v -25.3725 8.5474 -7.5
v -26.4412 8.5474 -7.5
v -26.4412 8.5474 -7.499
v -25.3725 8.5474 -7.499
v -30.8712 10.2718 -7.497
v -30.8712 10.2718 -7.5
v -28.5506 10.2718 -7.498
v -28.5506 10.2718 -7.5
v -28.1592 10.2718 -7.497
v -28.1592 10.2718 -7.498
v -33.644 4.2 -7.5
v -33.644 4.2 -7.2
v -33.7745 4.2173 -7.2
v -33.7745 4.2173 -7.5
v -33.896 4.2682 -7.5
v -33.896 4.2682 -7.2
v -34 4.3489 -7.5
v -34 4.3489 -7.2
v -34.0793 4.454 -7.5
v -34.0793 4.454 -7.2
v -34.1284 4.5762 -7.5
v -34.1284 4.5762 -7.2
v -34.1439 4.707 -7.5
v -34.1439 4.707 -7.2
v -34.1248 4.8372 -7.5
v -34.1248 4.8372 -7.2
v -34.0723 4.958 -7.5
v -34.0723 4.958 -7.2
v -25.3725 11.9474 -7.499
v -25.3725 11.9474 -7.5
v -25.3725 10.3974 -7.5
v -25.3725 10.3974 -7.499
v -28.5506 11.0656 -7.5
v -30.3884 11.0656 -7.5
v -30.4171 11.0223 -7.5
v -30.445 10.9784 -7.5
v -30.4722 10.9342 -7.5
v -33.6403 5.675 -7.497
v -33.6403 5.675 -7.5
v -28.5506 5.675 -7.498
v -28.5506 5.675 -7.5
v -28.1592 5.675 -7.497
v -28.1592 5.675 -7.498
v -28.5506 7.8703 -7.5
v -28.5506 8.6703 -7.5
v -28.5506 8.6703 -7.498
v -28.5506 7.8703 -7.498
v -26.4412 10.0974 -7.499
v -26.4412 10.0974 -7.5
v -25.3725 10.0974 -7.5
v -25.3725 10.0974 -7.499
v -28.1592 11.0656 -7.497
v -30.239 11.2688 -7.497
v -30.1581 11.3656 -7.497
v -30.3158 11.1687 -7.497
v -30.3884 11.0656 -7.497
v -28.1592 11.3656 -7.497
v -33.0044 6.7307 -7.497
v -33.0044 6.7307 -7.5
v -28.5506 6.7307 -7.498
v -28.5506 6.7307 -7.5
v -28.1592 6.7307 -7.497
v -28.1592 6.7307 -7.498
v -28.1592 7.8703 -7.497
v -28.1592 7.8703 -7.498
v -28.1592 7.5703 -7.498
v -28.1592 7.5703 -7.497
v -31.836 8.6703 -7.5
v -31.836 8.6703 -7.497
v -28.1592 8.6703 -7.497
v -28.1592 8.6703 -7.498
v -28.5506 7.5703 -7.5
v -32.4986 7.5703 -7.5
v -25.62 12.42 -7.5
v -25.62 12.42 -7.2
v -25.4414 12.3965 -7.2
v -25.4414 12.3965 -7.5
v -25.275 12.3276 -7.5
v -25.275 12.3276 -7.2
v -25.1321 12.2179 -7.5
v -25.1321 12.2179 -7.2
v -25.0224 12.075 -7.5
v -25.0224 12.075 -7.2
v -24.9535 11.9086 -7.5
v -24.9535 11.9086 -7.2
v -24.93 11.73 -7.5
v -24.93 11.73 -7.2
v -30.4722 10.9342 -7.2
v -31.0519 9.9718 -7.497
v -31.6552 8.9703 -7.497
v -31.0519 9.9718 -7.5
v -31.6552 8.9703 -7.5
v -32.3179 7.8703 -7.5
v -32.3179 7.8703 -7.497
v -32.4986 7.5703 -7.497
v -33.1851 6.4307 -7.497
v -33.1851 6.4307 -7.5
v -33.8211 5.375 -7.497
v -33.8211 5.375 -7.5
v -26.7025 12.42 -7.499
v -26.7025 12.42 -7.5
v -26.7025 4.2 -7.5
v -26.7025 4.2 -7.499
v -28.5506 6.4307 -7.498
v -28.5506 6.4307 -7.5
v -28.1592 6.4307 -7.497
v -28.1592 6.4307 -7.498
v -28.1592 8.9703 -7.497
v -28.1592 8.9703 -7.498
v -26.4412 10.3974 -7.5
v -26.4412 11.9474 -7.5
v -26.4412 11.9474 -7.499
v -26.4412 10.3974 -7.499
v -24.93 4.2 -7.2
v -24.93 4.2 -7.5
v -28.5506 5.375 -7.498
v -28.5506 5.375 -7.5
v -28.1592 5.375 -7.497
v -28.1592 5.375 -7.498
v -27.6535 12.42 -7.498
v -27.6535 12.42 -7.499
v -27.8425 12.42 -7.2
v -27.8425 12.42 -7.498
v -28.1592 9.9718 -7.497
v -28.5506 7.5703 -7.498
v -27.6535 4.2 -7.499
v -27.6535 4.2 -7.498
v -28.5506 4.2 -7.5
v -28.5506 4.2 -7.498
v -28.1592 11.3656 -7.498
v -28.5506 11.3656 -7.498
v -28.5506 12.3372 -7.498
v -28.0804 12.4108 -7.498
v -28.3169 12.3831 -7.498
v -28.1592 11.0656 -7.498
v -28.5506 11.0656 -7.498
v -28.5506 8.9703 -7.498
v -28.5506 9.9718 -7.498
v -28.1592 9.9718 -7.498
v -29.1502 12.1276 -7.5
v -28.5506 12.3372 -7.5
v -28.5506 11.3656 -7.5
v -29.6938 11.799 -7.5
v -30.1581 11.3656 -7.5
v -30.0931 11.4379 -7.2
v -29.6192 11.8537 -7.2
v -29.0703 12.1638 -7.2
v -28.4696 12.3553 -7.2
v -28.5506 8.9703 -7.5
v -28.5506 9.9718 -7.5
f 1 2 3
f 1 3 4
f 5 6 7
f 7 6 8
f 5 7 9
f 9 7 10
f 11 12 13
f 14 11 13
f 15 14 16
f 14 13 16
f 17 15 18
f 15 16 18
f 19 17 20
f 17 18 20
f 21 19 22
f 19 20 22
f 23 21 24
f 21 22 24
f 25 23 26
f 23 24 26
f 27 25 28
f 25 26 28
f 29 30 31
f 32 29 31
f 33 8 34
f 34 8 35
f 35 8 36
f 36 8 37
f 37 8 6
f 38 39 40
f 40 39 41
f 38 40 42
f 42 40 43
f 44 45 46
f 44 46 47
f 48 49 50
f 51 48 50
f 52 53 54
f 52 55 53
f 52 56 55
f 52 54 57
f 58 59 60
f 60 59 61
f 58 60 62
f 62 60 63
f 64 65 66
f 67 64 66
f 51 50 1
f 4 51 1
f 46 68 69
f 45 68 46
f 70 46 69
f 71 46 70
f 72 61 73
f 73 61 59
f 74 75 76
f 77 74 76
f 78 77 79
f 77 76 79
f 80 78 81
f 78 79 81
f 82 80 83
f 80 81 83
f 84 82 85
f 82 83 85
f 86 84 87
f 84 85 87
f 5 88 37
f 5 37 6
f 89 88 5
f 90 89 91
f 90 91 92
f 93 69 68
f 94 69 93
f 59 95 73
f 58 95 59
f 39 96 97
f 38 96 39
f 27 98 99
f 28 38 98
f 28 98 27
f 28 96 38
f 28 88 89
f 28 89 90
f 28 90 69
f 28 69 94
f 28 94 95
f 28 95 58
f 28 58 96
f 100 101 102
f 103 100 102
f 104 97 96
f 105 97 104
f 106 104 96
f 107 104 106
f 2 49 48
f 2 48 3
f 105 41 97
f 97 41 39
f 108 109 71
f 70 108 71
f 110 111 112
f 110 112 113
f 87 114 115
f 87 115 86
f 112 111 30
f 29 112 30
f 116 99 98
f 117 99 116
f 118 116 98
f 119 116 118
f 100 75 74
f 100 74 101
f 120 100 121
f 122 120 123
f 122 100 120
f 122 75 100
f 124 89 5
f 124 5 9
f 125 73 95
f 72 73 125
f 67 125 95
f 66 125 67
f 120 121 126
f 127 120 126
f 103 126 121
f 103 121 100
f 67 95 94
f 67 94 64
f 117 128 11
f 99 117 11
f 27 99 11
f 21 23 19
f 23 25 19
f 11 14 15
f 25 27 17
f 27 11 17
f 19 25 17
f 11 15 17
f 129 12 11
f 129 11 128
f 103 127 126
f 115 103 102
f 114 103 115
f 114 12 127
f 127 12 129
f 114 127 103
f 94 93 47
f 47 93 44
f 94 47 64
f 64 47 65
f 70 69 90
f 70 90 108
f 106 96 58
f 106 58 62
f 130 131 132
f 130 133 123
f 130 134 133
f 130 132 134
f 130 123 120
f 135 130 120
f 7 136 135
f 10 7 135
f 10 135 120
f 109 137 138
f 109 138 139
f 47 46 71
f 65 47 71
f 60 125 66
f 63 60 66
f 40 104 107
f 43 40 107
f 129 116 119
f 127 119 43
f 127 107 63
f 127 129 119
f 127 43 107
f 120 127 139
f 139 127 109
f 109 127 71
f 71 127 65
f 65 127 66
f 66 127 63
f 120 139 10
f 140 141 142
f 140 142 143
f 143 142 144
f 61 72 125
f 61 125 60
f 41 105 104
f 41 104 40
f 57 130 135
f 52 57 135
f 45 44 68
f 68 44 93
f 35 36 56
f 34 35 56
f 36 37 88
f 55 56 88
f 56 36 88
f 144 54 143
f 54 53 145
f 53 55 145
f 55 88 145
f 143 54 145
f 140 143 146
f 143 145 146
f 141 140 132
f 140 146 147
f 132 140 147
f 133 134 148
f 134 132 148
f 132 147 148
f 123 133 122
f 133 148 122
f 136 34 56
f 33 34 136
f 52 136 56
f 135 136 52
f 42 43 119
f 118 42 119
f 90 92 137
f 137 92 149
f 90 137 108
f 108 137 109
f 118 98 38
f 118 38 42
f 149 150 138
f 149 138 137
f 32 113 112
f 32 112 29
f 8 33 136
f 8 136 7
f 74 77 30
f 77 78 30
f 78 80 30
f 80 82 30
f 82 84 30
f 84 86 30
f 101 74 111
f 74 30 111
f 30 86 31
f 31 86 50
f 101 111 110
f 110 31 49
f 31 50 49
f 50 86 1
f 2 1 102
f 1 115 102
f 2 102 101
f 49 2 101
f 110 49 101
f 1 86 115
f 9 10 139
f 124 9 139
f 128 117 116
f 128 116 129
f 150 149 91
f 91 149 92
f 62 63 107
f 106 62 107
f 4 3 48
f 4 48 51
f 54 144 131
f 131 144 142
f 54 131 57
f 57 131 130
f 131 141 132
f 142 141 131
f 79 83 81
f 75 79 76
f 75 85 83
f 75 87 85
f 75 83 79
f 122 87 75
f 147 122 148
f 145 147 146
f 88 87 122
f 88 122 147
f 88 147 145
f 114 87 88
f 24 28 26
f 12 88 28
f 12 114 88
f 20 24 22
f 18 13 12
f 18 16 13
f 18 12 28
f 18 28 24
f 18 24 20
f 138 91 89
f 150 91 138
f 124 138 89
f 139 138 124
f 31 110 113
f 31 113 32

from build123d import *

# Parameters (mm, degrees)
PAD004_DEPTH    = 0.3
SKETCH019_W     = 0.950947
SKETCH019_H     = 8.22
SKETCH019_W_2   = 1.068769
SKETCH019_H_2   = 1.55
POCKET013_DEPTH = 0.001
SKETCH020_W     = 0.897089
SKETCH020_H     = 9.441198
POCKET014_DEPTH = 0.002
SKETCH021_W     = 5.864573
SKETCH021_H     = 0.3
SKETCH021_W_2   = 5.407206
SKETCH021_W_3   = 4.594198
SKETCH021_W_4   = 3.862932
SKETCH021_W_5   = 3.125059
SKETCH021_W_6   = 2.587548
POCKET015_DEPTH = 0.003


with BuildPart() as part:
    # Sketch018 (on Face1 of Binder004) → Pad004 (new body)
    with BuildSketch(Plane(origin=(0, 0, -7.2), x_dir=(1, 0, 0), z_dir=(0, 0, -1))):
        with BuildLine():
            Line((-33.643988, -4.2), (-24.93, -4.2))
            Line((-24.93, -4.2), (-24.93, -11.73))
            ThreePointArc((-25.62, -12.42), (-25.132096, -12.217904), (-24.93, -11.73))
            Line((-25.62, -12.42), (-27.842483, -12.42))
            ThreePointArc((-30.472186, -10.934159), (-29.352703, -12.022851), (-27.842483, -12.42))
            Line((-30.472186, -10.934159), (-34.072278, -4.958006))
            ThreePointArc((-33.643988, -4.2), (-34.079305, -4.454036), (-34.072278, -4.958006))
        make_face()
    extrude(amount=PAD004_DEPTH)

    # Sketch019 (on Face9 of Pad004) → Pocket013 (cut)
    with BuildSketch(Plane(origin=(0, 0, -7.5), x_dir=(1, 0, 0), z_dir=(0, 0, -1))):
        with Locations((-27.178016, -8.31)):
            Rectangle(SKETCH019_W, SKETCH019_H)
        with Locations((-25.906835, -9.322437)):
            Rectangle(SKETCH019_W_2, SKETCH019_H_2)
        with Locations((-25.906835, -11.172437)):
            Rectangle(SKETCH019_W_2, SKETCH019_H_2)
    extrude(amount=-POCKET013_DEPTH, mode=Mode.SUBTRACT)

    # Sketch020 (on Face5 of Pocket013) → Pocket014 (cut)
    with BuildSketch(Plane(origin=(0, 0, -7.5), x_dir=(1, 0, 0), z_dir=(0, 0, -1))):
        with Locations((-28.102034, -8.368765)):
            Rectangle(SKETCH020_W, SKETCH020_H)
    extrude(amount=-POCKET014_DEPTH, mode=Mode.SUBTRACT)

    # Sketch021 (on Face5 of Pocket014) → Pocket015 (cut)
    with BuildSketch(Plane(origin=(0, 0, -7.5), x_dir=(1, 0, 0), z_dir=(0, 0, -1))):
        with Locations((-31.091475, -5.52502)):
            Rectangle(SKETCH021_W, SKETCH021_H)
        with Locations((-30.862792, -6.580682)):
            Rectangle(SKETCH021_W_2, SKETCH021_H)
        with Locations((-30.456288, -7.720259)):
            Rectangle(SKETCH021_W_3, SKETCH021_H)
        with Locations((-30.090655, -8.820285)):
            Rectangle(SKETCH021_W_4, SKETCH021_H)
        with Locations((-29.721718, -10.121832)):
            Rectangle(SKETCH021_W_5, SKETCH021_H)
        with Locations((-29.452963, -11.215608)):
            Rectangle(SKETCH021_W_6, SKETCH021_H)
    extrude(amount=-POCKET015_DEPTH, mode=Mode.SUBTRACT)


solid = part.part
